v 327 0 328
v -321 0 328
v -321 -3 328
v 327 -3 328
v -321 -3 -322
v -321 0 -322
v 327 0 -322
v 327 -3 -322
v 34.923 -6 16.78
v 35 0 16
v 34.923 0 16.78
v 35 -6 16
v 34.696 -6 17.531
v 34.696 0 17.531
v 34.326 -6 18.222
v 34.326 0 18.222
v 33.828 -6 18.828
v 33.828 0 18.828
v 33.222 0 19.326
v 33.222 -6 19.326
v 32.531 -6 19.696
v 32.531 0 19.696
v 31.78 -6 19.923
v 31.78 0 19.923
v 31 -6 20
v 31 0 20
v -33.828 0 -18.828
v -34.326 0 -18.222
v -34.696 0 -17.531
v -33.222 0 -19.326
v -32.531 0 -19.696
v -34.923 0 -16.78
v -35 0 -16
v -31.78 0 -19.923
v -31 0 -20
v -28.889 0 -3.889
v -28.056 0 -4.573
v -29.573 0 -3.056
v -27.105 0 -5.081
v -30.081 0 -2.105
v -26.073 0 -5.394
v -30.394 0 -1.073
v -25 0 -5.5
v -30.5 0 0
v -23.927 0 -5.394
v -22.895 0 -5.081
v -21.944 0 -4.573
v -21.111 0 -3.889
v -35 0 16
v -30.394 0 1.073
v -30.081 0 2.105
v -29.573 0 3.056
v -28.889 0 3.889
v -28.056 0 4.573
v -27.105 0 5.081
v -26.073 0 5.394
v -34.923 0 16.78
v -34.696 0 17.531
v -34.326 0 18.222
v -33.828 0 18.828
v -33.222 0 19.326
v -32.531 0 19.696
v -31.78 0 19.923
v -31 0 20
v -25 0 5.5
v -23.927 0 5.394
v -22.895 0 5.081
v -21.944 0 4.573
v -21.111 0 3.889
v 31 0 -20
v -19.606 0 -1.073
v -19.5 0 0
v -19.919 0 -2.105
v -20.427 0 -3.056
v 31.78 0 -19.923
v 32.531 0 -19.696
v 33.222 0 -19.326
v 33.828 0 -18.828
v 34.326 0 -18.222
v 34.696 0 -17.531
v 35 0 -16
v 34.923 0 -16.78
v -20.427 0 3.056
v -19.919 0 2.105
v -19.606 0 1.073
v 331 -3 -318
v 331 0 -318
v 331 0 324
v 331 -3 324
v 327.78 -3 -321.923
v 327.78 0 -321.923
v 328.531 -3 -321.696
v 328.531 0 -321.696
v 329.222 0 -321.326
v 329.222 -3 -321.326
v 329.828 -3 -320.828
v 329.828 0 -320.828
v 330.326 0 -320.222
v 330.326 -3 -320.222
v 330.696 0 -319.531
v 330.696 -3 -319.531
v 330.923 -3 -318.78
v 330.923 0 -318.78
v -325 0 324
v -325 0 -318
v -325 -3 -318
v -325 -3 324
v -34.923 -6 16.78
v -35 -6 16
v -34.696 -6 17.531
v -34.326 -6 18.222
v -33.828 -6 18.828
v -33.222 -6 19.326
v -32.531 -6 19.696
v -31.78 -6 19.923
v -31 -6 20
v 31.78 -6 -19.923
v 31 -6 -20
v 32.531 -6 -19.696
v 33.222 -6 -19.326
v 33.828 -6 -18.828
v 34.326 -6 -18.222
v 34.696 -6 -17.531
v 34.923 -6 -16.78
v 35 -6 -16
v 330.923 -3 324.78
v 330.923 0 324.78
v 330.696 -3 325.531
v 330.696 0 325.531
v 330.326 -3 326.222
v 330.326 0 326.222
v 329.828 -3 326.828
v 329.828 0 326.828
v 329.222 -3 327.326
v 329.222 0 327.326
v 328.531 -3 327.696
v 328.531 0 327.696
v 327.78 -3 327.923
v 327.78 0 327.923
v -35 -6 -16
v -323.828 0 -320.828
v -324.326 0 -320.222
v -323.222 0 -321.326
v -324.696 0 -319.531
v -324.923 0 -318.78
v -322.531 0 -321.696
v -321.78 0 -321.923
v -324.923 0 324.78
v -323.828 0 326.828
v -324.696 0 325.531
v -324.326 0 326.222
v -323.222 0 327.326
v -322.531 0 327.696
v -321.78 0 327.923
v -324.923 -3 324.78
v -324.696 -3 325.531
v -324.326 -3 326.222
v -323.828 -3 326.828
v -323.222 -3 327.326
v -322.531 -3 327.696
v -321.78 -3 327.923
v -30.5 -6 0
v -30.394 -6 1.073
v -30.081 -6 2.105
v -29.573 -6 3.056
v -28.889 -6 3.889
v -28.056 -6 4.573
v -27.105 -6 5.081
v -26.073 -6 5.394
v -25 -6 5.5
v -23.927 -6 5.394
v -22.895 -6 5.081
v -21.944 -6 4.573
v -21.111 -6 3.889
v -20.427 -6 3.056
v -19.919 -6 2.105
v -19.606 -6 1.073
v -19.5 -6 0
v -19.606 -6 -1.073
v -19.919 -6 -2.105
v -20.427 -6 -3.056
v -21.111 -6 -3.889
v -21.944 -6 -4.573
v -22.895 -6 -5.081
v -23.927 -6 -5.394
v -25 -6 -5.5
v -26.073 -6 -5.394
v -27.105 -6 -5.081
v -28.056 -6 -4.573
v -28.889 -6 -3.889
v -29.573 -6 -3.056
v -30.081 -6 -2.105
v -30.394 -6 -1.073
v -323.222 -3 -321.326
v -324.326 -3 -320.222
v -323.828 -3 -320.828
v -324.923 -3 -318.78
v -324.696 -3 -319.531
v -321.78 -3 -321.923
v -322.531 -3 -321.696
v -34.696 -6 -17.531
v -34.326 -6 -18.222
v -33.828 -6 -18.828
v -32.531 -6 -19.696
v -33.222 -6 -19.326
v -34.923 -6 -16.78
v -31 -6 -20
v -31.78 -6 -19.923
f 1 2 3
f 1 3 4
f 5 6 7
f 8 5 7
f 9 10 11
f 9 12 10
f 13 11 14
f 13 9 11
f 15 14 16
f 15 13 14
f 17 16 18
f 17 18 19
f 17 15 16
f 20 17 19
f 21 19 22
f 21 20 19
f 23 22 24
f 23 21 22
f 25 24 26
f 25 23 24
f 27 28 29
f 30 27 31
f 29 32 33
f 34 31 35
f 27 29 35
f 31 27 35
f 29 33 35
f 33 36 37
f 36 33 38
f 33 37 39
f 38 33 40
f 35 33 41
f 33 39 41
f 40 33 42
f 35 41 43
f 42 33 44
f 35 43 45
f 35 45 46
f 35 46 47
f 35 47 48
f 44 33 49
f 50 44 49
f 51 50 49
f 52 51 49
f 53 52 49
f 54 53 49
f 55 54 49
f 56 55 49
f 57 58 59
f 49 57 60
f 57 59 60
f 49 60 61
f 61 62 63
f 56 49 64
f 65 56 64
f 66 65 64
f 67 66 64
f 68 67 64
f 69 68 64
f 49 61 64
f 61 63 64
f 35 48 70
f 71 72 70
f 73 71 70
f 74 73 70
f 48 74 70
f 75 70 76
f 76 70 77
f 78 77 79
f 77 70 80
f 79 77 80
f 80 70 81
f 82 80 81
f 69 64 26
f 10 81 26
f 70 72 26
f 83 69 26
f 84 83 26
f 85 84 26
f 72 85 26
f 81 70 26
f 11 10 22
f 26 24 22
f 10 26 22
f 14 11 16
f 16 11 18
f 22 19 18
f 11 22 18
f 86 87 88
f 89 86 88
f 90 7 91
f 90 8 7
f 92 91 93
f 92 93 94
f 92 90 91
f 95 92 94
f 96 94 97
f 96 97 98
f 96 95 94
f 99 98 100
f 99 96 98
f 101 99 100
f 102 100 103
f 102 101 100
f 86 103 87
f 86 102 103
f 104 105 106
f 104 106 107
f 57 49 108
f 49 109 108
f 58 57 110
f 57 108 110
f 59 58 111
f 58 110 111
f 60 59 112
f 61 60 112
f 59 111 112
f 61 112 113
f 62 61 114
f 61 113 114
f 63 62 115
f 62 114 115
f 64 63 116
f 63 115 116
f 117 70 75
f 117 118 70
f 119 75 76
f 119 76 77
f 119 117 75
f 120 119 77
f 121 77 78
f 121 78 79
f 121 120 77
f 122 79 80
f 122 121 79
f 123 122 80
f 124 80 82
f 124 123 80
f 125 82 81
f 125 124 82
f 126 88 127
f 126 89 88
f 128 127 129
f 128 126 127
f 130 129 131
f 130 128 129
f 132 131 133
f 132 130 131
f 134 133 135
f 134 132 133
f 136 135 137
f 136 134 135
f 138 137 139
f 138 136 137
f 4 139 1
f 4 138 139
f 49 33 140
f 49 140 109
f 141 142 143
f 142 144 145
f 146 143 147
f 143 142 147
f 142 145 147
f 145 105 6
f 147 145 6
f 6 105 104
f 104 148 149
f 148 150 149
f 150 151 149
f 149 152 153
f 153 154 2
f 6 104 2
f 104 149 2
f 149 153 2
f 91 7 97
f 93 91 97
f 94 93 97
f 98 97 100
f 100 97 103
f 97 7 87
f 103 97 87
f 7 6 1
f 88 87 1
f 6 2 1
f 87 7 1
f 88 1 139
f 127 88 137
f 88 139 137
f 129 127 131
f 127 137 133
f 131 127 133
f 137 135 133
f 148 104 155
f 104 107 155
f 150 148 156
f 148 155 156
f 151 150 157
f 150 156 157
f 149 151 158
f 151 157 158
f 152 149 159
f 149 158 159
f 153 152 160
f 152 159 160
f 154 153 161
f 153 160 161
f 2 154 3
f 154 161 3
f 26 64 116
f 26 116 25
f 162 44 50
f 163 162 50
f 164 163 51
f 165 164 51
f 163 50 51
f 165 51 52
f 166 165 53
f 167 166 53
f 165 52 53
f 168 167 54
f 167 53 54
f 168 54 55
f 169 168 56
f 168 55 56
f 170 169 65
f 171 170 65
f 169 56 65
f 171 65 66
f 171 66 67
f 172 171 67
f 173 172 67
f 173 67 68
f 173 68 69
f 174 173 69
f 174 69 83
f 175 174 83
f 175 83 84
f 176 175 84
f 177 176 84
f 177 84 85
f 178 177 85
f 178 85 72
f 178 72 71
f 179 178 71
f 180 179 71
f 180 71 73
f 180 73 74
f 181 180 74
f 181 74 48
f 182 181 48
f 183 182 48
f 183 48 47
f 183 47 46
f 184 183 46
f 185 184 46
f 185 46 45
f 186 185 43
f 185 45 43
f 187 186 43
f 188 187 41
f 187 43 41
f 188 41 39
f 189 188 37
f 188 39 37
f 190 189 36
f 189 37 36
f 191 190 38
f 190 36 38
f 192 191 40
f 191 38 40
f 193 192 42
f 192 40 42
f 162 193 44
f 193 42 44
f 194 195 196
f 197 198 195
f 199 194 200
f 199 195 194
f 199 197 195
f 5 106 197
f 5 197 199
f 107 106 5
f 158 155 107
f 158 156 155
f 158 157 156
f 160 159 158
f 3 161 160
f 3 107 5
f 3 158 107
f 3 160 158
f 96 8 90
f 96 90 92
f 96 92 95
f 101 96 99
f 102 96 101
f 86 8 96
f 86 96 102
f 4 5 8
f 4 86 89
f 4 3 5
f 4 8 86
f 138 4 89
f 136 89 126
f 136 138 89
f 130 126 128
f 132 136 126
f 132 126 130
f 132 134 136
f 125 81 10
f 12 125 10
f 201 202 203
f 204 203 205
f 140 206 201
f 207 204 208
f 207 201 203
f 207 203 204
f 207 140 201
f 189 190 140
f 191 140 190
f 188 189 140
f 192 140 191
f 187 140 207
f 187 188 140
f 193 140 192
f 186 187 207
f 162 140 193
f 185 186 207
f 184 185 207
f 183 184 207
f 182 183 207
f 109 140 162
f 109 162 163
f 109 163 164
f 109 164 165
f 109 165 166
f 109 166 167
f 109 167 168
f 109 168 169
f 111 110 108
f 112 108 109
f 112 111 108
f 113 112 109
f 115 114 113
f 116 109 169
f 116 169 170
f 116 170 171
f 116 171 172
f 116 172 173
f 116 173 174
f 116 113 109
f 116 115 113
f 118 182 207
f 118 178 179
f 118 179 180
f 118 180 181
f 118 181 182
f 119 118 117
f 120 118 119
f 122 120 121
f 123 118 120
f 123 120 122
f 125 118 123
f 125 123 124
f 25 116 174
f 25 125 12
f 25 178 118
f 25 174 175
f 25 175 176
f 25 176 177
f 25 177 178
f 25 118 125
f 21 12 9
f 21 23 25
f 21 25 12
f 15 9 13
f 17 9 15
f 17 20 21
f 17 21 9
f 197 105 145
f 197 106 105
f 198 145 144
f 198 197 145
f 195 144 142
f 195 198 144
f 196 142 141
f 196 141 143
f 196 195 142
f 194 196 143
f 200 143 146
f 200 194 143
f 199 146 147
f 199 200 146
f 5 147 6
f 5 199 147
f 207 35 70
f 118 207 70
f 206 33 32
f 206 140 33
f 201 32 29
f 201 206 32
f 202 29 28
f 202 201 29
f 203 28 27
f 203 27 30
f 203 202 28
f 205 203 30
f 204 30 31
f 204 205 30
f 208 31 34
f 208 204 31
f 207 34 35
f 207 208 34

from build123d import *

# Parameters (mm, degrees)
F0_W     = 70
F0_H     = 40
F1_DEPTH = 6
F2_R     = 4
F4_D     = 11
F5_W     = 656
F5_H     = 650
F6_DEPTH = 3
F7_R     = 4


with BuildPart() as f1:
    # F0 (on Front) → F1 (new body)
    with BuildSketch(Plane.XZ):
        Rectangle(F0_W, F0_H)
    extrude(amount=F1_DEPTH)

    # F2
    f2_edges = [f1.edges().sort_by_distance(p)[0] for p in [
        (35, -3, 20),
        (35, -3, -20),
        (-35, -3, 20),
        (-35, -3, -20),
    ]]
    fillet(f2_edges, radius=F2_R)

    # F4 (through all)
    with Locations(Plane.XZ.offset(6)):
        with Locations((-25, 0)):
            Hole(F4_D / 2)


with BuildPart() as f6:
    # F5 (on Front) → F6 (new body)
    with BuildSketch(Plane.XZ):
        with Locations((3, 3)):
            Rectangle(F5_W, F5_H)
    extrude(amount=F6_DEPTH)

    # F7
    f7_edges = [f6.edges().sort_by_distance(p)[0] for p in [
        (331, -1.5, 328),
        (-325, -1.5, 328),
        (331, -1.5, -322),
        (-325, -1.5, -322),
    ]]
    fillet(f7_edges, radius=F7_R)


solid = Compound([f1.part, f6.part])
